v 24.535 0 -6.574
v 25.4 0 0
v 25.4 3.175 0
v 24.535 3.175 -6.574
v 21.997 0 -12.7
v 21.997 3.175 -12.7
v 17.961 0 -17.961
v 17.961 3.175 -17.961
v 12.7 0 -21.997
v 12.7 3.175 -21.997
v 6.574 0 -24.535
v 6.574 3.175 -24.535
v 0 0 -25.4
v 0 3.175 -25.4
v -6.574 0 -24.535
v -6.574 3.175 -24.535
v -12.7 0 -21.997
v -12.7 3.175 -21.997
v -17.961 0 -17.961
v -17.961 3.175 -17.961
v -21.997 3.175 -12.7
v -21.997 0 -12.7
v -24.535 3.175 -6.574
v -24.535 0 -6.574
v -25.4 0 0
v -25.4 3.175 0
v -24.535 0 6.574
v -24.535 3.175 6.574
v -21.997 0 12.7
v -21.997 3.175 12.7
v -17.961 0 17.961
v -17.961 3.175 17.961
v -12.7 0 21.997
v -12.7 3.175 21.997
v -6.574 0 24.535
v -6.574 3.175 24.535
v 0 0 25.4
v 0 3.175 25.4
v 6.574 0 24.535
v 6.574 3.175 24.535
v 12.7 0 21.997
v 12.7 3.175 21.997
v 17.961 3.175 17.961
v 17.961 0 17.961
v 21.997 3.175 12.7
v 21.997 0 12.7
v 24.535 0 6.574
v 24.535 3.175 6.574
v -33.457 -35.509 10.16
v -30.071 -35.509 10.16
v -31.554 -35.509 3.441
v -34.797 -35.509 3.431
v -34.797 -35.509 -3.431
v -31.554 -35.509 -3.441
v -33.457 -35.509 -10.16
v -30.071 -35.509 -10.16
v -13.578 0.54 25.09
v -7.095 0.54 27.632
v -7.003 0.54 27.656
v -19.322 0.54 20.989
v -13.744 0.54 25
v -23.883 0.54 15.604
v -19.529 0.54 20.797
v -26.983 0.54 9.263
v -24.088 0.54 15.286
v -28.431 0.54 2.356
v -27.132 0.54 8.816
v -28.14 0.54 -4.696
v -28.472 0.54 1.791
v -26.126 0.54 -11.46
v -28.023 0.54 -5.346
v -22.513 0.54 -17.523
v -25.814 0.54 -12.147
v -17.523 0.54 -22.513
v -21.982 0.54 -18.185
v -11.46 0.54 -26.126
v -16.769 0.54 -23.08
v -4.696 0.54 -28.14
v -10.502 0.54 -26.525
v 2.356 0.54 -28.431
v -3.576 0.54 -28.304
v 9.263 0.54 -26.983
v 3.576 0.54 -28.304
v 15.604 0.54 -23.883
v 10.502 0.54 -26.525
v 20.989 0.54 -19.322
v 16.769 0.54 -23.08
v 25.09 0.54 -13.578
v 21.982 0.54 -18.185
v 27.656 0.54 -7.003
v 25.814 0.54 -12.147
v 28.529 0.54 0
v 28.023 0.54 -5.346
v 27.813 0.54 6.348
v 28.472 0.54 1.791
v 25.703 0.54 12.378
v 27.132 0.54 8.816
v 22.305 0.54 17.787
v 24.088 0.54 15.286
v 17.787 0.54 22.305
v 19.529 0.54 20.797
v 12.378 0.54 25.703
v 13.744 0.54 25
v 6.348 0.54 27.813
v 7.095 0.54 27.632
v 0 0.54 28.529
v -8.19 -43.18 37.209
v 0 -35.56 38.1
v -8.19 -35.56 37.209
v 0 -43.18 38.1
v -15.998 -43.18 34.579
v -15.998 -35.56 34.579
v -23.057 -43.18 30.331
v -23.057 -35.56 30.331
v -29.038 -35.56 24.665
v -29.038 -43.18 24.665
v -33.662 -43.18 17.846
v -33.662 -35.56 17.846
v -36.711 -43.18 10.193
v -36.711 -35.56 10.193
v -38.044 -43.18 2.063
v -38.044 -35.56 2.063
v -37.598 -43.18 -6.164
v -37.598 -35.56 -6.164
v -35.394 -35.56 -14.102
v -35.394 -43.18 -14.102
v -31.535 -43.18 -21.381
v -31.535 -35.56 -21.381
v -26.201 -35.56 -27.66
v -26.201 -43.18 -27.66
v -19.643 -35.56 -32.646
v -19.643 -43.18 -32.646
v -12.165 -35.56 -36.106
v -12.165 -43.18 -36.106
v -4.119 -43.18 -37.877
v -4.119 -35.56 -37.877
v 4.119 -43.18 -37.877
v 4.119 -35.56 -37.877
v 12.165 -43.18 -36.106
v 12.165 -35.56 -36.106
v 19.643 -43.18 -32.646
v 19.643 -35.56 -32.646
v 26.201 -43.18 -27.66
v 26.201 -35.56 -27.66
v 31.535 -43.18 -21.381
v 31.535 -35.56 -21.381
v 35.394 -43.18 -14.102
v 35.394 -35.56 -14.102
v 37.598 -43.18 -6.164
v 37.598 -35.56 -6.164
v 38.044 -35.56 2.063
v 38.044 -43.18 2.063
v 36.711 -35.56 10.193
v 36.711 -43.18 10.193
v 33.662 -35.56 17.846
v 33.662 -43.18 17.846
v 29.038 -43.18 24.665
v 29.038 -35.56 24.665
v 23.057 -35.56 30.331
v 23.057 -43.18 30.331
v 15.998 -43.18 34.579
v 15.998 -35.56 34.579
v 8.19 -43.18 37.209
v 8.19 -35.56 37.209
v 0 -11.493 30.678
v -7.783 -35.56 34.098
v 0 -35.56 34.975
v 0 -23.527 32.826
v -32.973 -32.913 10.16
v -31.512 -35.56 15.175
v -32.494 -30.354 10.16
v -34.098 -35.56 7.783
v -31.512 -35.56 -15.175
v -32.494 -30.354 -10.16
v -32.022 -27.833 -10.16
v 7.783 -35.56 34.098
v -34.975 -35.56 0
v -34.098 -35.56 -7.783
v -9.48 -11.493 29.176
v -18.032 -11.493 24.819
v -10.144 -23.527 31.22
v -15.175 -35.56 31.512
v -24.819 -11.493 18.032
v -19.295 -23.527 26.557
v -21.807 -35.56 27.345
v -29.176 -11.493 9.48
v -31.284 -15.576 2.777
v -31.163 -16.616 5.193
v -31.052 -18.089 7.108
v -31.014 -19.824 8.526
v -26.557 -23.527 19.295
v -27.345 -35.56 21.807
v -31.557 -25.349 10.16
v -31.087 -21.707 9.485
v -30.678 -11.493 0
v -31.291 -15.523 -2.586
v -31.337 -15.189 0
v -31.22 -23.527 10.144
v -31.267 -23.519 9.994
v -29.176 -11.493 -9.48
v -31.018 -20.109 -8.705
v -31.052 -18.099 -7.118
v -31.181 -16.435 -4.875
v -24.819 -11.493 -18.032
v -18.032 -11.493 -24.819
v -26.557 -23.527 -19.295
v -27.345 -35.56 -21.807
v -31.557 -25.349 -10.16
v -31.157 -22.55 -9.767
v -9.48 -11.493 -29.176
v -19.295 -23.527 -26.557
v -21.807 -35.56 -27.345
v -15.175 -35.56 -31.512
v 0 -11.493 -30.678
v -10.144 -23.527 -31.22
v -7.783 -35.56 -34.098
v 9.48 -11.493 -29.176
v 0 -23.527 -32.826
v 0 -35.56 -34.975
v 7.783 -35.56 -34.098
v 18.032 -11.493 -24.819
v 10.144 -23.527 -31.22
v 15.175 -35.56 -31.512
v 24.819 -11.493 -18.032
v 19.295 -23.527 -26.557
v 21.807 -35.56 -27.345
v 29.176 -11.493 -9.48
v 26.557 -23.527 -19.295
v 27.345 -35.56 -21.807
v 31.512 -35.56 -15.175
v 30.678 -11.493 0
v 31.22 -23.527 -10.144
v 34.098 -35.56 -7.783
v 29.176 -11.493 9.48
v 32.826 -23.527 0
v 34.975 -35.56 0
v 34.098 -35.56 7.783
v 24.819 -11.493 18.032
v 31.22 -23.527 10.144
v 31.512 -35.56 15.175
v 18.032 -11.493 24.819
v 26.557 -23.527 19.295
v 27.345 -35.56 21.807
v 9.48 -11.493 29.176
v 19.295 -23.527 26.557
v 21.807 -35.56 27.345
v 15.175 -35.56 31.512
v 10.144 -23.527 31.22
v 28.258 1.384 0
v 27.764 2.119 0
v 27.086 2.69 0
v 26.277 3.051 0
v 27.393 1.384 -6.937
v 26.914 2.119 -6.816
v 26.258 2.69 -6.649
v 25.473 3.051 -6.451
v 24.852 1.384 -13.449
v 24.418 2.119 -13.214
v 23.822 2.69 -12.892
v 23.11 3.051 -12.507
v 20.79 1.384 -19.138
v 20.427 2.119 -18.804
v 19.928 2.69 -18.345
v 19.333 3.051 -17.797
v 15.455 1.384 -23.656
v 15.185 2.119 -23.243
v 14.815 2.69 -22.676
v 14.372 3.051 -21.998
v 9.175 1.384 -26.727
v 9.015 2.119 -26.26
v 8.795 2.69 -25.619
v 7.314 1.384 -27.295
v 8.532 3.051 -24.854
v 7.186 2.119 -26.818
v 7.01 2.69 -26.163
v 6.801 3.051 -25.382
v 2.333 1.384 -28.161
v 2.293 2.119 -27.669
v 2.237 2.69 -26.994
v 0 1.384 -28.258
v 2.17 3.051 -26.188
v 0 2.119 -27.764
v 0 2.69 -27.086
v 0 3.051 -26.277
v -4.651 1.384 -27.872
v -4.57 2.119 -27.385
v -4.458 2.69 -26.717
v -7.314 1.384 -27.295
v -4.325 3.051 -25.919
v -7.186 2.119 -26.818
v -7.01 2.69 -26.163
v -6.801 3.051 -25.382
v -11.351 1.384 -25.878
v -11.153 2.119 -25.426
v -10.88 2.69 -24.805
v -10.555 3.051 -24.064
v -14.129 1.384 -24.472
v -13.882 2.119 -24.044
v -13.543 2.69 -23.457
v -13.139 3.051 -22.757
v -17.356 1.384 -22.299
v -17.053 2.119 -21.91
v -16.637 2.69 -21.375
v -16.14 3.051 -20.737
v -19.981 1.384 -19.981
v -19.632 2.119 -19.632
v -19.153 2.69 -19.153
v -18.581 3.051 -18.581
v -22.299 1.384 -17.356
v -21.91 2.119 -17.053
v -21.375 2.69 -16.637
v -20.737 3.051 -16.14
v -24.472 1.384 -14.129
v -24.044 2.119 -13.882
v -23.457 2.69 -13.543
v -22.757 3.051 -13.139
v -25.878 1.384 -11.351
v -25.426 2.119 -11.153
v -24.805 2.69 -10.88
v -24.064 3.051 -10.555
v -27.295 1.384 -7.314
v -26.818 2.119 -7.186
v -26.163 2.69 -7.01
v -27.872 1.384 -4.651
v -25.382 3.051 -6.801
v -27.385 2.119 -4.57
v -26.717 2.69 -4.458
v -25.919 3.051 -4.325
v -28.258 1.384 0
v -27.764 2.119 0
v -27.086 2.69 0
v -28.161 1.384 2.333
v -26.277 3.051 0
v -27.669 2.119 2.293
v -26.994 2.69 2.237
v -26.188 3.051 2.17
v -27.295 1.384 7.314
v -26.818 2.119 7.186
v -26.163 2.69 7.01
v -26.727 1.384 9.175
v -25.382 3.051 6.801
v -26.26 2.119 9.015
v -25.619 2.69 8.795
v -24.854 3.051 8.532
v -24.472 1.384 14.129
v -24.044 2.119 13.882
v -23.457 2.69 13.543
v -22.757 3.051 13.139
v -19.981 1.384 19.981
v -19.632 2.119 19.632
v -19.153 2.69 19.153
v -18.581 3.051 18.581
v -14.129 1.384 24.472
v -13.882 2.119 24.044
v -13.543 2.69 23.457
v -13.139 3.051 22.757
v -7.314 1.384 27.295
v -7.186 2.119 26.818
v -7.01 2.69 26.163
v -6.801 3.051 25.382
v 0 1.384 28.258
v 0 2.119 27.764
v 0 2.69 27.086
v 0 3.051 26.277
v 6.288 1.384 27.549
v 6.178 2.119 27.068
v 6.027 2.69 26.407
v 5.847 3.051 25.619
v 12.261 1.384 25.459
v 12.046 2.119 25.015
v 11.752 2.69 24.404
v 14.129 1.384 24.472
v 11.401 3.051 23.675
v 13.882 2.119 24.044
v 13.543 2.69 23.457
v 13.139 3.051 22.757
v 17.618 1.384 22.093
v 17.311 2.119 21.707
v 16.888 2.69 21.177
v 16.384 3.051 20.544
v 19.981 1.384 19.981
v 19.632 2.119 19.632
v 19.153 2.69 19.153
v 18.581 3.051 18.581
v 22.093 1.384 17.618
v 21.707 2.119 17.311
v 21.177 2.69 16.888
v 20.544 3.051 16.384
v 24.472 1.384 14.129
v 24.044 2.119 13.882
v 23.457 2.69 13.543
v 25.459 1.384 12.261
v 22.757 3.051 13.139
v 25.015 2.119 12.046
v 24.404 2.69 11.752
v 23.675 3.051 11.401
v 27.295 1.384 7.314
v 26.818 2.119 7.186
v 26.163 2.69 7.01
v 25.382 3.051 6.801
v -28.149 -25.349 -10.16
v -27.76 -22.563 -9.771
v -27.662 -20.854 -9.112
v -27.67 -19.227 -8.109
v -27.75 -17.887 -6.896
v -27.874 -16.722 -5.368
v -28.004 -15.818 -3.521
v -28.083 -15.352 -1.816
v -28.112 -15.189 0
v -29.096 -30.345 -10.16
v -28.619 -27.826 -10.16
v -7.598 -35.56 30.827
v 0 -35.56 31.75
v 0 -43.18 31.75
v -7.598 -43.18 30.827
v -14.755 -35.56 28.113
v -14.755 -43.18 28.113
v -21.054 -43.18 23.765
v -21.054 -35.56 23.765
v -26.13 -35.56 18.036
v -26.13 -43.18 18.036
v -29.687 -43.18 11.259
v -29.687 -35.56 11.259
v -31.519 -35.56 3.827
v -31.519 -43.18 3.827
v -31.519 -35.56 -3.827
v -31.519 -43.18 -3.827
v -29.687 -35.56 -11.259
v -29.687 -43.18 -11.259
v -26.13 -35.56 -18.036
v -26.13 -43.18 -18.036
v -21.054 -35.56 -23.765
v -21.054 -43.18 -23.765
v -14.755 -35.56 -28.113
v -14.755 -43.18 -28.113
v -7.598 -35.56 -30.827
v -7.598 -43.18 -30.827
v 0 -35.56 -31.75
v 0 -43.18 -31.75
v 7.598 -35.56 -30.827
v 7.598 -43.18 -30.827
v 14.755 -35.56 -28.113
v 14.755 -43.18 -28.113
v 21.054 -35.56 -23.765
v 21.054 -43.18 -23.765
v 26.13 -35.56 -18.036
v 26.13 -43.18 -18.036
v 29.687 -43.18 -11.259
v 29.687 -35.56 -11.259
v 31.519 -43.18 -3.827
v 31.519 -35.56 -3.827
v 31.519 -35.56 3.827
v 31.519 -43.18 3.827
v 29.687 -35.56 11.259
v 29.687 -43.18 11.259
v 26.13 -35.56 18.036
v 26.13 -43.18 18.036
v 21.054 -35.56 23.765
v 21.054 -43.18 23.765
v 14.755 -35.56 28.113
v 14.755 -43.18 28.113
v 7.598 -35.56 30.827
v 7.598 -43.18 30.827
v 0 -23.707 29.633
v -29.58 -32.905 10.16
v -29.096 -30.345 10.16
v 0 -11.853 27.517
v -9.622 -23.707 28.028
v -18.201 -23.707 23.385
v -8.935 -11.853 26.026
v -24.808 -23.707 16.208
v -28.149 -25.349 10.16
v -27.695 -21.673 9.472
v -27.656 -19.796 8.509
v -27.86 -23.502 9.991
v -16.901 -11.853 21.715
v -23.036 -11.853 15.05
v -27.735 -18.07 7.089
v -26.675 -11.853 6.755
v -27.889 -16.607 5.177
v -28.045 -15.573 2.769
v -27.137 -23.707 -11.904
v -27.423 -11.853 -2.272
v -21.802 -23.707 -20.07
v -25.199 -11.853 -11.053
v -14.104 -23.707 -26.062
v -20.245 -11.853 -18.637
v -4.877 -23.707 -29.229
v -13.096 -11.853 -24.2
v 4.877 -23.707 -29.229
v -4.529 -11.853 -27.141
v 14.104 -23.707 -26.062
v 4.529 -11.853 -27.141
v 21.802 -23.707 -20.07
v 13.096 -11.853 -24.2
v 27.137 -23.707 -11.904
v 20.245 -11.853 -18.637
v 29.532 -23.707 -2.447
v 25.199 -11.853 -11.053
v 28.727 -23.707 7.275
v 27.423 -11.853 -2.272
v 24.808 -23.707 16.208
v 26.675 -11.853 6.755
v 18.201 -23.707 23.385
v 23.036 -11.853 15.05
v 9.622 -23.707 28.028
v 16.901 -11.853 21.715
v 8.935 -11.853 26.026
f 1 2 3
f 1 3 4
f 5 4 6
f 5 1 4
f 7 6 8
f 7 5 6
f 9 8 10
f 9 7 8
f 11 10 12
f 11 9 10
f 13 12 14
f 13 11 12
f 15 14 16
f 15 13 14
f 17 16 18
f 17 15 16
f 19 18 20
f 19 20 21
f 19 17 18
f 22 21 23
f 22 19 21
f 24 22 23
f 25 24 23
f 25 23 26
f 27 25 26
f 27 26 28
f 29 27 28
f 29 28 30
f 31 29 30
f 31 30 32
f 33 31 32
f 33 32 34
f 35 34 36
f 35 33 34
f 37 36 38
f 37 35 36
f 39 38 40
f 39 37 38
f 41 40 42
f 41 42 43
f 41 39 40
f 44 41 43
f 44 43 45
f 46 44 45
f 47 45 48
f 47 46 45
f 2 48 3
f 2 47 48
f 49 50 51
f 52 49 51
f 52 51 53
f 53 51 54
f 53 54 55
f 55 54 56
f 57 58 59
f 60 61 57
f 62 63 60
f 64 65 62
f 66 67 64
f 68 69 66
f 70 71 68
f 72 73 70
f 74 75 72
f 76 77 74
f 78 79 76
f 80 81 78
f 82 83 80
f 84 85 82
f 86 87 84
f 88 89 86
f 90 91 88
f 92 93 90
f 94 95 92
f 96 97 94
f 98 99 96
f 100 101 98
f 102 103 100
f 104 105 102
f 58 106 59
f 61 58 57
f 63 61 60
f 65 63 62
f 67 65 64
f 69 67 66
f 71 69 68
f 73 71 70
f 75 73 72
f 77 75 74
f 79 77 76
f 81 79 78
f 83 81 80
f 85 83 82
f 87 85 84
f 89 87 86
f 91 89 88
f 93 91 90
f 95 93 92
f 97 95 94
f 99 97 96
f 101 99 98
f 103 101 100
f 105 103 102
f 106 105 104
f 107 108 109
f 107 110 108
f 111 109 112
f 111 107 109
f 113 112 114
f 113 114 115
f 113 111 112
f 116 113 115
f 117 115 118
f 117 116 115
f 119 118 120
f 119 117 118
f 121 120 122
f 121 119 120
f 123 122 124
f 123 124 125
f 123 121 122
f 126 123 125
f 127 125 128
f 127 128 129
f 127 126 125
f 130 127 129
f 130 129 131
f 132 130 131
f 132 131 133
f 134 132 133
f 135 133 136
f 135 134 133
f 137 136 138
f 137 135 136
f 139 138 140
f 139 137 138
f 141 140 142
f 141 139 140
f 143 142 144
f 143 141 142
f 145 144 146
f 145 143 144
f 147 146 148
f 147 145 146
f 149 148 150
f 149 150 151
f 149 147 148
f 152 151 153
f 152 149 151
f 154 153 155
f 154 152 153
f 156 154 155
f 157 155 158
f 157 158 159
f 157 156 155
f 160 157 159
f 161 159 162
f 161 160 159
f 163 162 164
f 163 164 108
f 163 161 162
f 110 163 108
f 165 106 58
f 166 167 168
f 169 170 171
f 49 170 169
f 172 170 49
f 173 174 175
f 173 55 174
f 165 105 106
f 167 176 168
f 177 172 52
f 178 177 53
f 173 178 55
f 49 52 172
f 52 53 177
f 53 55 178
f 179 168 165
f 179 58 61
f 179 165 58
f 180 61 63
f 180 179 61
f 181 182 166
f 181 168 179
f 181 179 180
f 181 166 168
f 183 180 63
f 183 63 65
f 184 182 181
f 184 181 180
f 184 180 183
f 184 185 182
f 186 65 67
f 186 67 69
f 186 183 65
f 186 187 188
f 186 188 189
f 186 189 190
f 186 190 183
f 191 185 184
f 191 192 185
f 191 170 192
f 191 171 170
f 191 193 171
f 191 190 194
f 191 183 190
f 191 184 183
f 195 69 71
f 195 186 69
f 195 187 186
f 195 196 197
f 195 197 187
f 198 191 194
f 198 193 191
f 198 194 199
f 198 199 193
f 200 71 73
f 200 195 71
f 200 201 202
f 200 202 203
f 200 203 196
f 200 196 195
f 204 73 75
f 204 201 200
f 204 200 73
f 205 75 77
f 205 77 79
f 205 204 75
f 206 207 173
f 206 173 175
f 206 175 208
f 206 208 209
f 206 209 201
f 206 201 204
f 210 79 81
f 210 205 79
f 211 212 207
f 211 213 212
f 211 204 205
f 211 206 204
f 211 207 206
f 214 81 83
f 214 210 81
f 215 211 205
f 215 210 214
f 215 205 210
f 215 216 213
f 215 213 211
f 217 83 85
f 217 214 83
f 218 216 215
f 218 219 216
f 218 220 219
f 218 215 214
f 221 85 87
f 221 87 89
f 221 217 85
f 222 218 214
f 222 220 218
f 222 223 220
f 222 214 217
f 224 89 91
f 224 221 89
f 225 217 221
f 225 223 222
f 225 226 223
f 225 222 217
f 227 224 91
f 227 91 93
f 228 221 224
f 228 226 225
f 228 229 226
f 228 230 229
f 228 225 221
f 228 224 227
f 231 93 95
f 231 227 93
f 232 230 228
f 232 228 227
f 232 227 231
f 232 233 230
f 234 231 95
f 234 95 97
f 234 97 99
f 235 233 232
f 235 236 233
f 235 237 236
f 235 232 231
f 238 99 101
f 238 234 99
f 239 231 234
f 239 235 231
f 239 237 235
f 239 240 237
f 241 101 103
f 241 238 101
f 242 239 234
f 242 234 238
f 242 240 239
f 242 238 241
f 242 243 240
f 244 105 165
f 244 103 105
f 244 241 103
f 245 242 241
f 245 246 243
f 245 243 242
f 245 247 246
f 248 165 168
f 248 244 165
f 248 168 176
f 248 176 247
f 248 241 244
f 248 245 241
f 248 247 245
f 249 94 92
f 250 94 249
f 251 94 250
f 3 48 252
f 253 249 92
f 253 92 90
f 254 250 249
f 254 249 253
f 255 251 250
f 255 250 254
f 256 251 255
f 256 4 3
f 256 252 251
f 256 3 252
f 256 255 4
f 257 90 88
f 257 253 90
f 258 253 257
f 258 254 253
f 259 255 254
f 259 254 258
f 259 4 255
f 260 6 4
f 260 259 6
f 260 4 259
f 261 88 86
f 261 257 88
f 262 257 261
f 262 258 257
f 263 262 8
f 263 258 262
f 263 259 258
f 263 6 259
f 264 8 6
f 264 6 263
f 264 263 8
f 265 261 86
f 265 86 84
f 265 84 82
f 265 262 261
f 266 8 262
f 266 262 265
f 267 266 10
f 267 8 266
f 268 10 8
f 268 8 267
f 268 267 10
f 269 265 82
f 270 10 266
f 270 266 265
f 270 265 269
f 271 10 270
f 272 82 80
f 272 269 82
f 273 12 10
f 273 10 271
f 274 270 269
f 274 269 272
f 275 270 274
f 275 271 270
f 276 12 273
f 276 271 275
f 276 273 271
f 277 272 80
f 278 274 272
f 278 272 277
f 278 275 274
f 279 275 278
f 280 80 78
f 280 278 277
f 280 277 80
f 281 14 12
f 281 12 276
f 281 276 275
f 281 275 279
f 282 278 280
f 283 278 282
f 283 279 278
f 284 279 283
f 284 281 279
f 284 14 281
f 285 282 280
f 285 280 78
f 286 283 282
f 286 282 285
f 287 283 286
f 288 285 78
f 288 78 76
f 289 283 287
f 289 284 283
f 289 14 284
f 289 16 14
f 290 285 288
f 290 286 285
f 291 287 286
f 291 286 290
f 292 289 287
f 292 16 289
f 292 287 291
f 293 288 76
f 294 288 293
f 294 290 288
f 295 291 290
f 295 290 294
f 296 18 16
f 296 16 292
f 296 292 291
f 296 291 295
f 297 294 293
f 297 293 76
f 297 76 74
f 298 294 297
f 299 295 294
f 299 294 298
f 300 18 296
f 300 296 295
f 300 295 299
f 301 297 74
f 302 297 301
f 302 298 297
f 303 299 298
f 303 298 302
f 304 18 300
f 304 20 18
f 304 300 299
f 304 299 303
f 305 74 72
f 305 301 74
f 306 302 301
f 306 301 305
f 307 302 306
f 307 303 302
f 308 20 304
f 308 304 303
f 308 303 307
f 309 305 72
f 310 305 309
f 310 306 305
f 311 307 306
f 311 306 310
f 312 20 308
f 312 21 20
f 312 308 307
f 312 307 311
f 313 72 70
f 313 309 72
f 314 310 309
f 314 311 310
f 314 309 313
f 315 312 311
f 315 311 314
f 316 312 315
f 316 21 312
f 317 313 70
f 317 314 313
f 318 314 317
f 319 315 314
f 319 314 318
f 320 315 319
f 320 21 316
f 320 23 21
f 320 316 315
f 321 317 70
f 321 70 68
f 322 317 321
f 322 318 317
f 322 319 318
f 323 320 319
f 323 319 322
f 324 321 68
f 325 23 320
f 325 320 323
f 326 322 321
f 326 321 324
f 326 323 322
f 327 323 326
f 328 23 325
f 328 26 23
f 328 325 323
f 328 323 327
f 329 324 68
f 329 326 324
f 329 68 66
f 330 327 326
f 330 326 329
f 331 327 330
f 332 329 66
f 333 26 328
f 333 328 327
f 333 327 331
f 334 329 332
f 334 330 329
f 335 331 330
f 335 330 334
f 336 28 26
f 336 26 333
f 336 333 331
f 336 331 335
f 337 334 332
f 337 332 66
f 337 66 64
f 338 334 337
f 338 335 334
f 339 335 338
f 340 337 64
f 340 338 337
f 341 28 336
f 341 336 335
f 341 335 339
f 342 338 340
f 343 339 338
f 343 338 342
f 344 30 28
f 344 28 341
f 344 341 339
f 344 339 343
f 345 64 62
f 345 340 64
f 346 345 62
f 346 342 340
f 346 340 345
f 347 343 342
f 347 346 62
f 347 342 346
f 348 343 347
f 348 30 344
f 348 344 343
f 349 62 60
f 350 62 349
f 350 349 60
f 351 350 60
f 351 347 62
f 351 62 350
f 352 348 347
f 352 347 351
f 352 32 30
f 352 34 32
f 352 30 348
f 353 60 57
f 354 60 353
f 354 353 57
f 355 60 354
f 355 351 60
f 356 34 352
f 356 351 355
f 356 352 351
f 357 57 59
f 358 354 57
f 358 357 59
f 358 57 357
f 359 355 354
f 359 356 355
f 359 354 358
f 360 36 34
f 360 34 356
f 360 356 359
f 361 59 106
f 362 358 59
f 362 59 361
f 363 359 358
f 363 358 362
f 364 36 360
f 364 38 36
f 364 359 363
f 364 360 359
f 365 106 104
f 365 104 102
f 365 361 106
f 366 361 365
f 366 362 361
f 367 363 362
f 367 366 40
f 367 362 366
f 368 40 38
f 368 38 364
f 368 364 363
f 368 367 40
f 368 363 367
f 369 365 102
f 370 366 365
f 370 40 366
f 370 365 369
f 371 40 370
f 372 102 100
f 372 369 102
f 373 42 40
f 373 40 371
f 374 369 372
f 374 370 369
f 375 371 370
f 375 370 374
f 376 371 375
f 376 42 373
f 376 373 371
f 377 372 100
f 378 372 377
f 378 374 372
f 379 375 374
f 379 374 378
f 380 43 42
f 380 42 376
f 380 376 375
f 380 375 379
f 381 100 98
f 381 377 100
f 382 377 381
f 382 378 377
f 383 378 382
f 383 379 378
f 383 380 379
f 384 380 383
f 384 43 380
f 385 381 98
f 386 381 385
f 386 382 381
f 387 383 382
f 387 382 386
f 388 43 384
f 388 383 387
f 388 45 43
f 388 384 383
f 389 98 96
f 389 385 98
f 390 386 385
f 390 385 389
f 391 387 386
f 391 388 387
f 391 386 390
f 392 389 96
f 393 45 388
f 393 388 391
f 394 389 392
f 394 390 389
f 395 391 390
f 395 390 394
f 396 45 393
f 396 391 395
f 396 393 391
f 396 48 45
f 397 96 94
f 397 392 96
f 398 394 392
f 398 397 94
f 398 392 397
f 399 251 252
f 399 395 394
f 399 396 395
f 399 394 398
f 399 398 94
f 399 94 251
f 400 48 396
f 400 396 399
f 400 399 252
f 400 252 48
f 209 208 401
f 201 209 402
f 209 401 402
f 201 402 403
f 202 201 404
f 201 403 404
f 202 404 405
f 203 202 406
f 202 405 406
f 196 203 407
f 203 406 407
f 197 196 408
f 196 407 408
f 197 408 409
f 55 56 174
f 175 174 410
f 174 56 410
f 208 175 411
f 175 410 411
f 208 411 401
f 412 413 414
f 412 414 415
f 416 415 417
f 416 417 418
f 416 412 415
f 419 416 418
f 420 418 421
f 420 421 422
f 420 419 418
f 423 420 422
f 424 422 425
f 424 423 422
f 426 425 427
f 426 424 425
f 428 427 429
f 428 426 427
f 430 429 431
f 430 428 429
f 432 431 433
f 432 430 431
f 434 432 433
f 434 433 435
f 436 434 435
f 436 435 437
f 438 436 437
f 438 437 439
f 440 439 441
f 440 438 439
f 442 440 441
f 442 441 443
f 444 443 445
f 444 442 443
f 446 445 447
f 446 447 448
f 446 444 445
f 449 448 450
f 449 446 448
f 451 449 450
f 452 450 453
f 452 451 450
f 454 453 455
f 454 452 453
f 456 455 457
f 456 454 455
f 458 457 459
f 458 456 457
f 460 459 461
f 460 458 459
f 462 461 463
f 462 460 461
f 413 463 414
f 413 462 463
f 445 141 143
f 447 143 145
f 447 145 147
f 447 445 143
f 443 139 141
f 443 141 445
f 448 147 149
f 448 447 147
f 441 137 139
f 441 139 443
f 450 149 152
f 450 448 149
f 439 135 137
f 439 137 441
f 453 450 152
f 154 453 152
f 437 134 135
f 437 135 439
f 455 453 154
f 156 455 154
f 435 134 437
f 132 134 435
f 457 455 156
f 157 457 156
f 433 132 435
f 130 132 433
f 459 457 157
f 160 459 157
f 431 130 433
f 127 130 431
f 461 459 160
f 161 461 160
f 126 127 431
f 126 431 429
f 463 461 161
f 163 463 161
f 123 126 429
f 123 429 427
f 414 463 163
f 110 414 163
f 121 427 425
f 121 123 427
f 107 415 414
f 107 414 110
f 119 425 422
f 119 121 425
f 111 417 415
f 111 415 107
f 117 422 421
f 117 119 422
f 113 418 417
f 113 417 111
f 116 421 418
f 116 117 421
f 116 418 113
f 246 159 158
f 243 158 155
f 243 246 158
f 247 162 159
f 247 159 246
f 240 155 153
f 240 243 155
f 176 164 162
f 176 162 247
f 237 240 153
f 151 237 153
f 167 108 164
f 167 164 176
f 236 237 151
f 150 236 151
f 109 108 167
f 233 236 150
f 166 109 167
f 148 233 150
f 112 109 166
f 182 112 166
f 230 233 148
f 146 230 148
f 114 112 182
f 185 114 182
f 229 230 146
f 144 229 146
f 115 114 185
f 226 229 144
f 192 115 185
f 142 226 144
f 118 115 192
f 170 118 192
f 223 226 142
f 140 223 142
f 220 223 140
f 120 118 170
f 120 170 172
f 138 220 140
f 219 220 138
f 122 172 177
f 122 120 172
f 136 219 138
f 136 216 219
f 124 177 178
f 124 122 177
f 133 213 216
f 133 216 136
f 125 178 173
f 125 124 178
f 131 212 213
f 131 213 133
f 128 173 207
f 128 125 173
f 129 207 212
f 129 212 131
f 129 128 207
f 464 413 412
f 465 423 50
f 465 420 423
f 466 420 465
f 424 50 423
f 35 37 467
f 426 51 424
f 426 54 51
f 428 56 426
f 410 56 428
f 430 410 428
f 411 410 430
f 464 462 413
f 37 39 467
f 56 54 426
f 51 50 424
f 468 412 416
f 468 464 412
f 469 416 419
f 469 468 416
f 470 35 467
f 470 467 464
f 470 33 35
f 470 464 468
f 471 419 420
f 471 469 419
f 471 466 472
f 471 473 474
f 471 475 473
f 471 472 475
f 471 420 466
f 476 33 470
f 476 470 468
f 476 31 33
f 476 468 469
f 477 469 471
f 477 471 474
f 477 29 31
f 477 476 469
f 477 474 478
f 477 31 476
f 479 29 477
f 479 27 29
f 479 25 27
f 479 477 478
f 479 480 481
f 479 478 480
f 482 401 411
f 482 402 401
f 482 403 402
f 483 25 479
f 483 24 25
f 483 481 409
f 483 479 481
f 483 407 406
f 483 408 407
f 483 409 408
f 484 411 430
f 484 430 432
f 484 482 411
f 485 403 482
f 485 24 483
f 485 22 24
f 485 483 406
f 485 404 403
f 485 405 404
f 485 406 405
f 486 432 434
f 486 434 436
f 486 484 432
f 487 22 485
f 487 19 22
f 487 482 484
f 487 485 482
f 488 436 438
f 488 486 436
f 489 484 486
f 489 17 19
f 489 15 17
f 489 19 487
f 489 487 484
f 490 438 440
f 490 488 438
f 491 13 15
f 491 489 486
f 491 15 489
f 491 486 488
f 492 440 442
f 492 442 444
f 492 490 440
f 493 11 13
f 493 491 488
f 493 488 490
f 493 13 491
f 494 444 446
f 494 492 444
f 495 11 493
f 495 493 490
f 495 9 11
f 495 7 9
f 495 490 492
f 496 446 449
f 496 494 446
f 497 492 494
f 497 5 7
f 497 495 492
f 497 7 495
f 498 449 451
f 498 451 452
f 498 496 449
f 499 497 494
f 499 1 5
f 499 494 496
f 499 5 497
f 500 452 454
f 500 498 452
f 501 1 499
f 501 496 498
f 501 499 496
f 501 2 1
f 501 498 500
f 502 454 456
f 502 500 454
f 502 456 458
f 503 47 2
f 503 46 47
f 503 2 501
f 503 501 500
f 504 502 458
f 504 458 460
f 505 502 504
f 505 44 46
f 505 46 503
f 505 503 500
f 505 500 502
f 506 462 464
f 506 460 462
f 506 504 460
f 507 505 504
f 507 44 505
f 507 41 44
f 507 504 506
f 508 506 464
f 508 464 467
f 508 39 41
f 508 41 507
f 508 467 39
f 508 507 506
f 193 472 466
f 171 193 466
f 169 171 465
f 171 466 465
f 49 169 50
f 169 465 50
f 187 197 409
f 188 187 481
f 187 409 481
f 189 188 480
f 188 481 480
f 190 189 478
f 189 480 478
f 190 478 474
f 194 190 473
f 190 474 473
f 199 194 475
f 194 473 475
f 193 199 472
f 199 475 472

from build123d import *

# Parameters (mm, degrees)
F6_DEPTH = 38.1


with BuildPart() as f2:
    # F0 (on Right) → F2 (revolve)
    with BuildSketch(Plane.YZ):
        Polygon((-35.56, 31.75), (0, 25.4), (0.5401693397, 28.5287657554), (-35.56, 34.975224566), align=None)
    revolve(axis=Axis((0, -17.78, 0), (0, -1, 0)))

    # F1 (on Top) → F3 (revolve)
    with BuildSketch(Plane.XY):
        with BuildLine():
            Line((25.4, 3.175), (25.4, 0))
            Line((25.4, 0), (28.575, 0))
            ThreePointArc((28.575, 0), (27.6450640303, 2.2450640303), (25.4, 3.175))
        make_face()
    revolve(axis=Axis((0, 1.5875, 0), (0, 1, 0)))

    # F0 (on Right) → F4 (revolve)
    with BuildSketch(Plane.YZ):
        Polygon((-43.18, 31.75), (-35.56, 31.75), (-35.56, 34.975224566), (-35.56, 38.1), (-43.18, 38.1), align=None)
    revolve(axis=Axis((0, -39.37, 0), (0, -1, 0)))

    # F5 (on Right) → F6 (cut)
    with BuildSketch(Plane.YZ):
        with BuildLine():
            Line((-35.5086600387, 10.16), (-35.5086600387, 0))
            Line((-35.5086600387, 0), (-35.5086600387, -10.16))
            Line((-35.5086600387, -10.16), (-25.3486600387, -10.16))
            ThreePointArc((-25.3486600387, -10.16), (-18.1644551419, -7.1842048969), (-15.1886600387, 0))
            ThreePointArc((-15.1886600387, 0), (-18.1644551419, 7.1842048969), (-25.3486600387, 10.16))
            Line((-25.3486600387, 10.16), (-35.5086600387, 10.16))
        make_face()
    extrude(amount=-F6_DEPTH, mode=Mode.SUBTRACT)


solid = f2.part
